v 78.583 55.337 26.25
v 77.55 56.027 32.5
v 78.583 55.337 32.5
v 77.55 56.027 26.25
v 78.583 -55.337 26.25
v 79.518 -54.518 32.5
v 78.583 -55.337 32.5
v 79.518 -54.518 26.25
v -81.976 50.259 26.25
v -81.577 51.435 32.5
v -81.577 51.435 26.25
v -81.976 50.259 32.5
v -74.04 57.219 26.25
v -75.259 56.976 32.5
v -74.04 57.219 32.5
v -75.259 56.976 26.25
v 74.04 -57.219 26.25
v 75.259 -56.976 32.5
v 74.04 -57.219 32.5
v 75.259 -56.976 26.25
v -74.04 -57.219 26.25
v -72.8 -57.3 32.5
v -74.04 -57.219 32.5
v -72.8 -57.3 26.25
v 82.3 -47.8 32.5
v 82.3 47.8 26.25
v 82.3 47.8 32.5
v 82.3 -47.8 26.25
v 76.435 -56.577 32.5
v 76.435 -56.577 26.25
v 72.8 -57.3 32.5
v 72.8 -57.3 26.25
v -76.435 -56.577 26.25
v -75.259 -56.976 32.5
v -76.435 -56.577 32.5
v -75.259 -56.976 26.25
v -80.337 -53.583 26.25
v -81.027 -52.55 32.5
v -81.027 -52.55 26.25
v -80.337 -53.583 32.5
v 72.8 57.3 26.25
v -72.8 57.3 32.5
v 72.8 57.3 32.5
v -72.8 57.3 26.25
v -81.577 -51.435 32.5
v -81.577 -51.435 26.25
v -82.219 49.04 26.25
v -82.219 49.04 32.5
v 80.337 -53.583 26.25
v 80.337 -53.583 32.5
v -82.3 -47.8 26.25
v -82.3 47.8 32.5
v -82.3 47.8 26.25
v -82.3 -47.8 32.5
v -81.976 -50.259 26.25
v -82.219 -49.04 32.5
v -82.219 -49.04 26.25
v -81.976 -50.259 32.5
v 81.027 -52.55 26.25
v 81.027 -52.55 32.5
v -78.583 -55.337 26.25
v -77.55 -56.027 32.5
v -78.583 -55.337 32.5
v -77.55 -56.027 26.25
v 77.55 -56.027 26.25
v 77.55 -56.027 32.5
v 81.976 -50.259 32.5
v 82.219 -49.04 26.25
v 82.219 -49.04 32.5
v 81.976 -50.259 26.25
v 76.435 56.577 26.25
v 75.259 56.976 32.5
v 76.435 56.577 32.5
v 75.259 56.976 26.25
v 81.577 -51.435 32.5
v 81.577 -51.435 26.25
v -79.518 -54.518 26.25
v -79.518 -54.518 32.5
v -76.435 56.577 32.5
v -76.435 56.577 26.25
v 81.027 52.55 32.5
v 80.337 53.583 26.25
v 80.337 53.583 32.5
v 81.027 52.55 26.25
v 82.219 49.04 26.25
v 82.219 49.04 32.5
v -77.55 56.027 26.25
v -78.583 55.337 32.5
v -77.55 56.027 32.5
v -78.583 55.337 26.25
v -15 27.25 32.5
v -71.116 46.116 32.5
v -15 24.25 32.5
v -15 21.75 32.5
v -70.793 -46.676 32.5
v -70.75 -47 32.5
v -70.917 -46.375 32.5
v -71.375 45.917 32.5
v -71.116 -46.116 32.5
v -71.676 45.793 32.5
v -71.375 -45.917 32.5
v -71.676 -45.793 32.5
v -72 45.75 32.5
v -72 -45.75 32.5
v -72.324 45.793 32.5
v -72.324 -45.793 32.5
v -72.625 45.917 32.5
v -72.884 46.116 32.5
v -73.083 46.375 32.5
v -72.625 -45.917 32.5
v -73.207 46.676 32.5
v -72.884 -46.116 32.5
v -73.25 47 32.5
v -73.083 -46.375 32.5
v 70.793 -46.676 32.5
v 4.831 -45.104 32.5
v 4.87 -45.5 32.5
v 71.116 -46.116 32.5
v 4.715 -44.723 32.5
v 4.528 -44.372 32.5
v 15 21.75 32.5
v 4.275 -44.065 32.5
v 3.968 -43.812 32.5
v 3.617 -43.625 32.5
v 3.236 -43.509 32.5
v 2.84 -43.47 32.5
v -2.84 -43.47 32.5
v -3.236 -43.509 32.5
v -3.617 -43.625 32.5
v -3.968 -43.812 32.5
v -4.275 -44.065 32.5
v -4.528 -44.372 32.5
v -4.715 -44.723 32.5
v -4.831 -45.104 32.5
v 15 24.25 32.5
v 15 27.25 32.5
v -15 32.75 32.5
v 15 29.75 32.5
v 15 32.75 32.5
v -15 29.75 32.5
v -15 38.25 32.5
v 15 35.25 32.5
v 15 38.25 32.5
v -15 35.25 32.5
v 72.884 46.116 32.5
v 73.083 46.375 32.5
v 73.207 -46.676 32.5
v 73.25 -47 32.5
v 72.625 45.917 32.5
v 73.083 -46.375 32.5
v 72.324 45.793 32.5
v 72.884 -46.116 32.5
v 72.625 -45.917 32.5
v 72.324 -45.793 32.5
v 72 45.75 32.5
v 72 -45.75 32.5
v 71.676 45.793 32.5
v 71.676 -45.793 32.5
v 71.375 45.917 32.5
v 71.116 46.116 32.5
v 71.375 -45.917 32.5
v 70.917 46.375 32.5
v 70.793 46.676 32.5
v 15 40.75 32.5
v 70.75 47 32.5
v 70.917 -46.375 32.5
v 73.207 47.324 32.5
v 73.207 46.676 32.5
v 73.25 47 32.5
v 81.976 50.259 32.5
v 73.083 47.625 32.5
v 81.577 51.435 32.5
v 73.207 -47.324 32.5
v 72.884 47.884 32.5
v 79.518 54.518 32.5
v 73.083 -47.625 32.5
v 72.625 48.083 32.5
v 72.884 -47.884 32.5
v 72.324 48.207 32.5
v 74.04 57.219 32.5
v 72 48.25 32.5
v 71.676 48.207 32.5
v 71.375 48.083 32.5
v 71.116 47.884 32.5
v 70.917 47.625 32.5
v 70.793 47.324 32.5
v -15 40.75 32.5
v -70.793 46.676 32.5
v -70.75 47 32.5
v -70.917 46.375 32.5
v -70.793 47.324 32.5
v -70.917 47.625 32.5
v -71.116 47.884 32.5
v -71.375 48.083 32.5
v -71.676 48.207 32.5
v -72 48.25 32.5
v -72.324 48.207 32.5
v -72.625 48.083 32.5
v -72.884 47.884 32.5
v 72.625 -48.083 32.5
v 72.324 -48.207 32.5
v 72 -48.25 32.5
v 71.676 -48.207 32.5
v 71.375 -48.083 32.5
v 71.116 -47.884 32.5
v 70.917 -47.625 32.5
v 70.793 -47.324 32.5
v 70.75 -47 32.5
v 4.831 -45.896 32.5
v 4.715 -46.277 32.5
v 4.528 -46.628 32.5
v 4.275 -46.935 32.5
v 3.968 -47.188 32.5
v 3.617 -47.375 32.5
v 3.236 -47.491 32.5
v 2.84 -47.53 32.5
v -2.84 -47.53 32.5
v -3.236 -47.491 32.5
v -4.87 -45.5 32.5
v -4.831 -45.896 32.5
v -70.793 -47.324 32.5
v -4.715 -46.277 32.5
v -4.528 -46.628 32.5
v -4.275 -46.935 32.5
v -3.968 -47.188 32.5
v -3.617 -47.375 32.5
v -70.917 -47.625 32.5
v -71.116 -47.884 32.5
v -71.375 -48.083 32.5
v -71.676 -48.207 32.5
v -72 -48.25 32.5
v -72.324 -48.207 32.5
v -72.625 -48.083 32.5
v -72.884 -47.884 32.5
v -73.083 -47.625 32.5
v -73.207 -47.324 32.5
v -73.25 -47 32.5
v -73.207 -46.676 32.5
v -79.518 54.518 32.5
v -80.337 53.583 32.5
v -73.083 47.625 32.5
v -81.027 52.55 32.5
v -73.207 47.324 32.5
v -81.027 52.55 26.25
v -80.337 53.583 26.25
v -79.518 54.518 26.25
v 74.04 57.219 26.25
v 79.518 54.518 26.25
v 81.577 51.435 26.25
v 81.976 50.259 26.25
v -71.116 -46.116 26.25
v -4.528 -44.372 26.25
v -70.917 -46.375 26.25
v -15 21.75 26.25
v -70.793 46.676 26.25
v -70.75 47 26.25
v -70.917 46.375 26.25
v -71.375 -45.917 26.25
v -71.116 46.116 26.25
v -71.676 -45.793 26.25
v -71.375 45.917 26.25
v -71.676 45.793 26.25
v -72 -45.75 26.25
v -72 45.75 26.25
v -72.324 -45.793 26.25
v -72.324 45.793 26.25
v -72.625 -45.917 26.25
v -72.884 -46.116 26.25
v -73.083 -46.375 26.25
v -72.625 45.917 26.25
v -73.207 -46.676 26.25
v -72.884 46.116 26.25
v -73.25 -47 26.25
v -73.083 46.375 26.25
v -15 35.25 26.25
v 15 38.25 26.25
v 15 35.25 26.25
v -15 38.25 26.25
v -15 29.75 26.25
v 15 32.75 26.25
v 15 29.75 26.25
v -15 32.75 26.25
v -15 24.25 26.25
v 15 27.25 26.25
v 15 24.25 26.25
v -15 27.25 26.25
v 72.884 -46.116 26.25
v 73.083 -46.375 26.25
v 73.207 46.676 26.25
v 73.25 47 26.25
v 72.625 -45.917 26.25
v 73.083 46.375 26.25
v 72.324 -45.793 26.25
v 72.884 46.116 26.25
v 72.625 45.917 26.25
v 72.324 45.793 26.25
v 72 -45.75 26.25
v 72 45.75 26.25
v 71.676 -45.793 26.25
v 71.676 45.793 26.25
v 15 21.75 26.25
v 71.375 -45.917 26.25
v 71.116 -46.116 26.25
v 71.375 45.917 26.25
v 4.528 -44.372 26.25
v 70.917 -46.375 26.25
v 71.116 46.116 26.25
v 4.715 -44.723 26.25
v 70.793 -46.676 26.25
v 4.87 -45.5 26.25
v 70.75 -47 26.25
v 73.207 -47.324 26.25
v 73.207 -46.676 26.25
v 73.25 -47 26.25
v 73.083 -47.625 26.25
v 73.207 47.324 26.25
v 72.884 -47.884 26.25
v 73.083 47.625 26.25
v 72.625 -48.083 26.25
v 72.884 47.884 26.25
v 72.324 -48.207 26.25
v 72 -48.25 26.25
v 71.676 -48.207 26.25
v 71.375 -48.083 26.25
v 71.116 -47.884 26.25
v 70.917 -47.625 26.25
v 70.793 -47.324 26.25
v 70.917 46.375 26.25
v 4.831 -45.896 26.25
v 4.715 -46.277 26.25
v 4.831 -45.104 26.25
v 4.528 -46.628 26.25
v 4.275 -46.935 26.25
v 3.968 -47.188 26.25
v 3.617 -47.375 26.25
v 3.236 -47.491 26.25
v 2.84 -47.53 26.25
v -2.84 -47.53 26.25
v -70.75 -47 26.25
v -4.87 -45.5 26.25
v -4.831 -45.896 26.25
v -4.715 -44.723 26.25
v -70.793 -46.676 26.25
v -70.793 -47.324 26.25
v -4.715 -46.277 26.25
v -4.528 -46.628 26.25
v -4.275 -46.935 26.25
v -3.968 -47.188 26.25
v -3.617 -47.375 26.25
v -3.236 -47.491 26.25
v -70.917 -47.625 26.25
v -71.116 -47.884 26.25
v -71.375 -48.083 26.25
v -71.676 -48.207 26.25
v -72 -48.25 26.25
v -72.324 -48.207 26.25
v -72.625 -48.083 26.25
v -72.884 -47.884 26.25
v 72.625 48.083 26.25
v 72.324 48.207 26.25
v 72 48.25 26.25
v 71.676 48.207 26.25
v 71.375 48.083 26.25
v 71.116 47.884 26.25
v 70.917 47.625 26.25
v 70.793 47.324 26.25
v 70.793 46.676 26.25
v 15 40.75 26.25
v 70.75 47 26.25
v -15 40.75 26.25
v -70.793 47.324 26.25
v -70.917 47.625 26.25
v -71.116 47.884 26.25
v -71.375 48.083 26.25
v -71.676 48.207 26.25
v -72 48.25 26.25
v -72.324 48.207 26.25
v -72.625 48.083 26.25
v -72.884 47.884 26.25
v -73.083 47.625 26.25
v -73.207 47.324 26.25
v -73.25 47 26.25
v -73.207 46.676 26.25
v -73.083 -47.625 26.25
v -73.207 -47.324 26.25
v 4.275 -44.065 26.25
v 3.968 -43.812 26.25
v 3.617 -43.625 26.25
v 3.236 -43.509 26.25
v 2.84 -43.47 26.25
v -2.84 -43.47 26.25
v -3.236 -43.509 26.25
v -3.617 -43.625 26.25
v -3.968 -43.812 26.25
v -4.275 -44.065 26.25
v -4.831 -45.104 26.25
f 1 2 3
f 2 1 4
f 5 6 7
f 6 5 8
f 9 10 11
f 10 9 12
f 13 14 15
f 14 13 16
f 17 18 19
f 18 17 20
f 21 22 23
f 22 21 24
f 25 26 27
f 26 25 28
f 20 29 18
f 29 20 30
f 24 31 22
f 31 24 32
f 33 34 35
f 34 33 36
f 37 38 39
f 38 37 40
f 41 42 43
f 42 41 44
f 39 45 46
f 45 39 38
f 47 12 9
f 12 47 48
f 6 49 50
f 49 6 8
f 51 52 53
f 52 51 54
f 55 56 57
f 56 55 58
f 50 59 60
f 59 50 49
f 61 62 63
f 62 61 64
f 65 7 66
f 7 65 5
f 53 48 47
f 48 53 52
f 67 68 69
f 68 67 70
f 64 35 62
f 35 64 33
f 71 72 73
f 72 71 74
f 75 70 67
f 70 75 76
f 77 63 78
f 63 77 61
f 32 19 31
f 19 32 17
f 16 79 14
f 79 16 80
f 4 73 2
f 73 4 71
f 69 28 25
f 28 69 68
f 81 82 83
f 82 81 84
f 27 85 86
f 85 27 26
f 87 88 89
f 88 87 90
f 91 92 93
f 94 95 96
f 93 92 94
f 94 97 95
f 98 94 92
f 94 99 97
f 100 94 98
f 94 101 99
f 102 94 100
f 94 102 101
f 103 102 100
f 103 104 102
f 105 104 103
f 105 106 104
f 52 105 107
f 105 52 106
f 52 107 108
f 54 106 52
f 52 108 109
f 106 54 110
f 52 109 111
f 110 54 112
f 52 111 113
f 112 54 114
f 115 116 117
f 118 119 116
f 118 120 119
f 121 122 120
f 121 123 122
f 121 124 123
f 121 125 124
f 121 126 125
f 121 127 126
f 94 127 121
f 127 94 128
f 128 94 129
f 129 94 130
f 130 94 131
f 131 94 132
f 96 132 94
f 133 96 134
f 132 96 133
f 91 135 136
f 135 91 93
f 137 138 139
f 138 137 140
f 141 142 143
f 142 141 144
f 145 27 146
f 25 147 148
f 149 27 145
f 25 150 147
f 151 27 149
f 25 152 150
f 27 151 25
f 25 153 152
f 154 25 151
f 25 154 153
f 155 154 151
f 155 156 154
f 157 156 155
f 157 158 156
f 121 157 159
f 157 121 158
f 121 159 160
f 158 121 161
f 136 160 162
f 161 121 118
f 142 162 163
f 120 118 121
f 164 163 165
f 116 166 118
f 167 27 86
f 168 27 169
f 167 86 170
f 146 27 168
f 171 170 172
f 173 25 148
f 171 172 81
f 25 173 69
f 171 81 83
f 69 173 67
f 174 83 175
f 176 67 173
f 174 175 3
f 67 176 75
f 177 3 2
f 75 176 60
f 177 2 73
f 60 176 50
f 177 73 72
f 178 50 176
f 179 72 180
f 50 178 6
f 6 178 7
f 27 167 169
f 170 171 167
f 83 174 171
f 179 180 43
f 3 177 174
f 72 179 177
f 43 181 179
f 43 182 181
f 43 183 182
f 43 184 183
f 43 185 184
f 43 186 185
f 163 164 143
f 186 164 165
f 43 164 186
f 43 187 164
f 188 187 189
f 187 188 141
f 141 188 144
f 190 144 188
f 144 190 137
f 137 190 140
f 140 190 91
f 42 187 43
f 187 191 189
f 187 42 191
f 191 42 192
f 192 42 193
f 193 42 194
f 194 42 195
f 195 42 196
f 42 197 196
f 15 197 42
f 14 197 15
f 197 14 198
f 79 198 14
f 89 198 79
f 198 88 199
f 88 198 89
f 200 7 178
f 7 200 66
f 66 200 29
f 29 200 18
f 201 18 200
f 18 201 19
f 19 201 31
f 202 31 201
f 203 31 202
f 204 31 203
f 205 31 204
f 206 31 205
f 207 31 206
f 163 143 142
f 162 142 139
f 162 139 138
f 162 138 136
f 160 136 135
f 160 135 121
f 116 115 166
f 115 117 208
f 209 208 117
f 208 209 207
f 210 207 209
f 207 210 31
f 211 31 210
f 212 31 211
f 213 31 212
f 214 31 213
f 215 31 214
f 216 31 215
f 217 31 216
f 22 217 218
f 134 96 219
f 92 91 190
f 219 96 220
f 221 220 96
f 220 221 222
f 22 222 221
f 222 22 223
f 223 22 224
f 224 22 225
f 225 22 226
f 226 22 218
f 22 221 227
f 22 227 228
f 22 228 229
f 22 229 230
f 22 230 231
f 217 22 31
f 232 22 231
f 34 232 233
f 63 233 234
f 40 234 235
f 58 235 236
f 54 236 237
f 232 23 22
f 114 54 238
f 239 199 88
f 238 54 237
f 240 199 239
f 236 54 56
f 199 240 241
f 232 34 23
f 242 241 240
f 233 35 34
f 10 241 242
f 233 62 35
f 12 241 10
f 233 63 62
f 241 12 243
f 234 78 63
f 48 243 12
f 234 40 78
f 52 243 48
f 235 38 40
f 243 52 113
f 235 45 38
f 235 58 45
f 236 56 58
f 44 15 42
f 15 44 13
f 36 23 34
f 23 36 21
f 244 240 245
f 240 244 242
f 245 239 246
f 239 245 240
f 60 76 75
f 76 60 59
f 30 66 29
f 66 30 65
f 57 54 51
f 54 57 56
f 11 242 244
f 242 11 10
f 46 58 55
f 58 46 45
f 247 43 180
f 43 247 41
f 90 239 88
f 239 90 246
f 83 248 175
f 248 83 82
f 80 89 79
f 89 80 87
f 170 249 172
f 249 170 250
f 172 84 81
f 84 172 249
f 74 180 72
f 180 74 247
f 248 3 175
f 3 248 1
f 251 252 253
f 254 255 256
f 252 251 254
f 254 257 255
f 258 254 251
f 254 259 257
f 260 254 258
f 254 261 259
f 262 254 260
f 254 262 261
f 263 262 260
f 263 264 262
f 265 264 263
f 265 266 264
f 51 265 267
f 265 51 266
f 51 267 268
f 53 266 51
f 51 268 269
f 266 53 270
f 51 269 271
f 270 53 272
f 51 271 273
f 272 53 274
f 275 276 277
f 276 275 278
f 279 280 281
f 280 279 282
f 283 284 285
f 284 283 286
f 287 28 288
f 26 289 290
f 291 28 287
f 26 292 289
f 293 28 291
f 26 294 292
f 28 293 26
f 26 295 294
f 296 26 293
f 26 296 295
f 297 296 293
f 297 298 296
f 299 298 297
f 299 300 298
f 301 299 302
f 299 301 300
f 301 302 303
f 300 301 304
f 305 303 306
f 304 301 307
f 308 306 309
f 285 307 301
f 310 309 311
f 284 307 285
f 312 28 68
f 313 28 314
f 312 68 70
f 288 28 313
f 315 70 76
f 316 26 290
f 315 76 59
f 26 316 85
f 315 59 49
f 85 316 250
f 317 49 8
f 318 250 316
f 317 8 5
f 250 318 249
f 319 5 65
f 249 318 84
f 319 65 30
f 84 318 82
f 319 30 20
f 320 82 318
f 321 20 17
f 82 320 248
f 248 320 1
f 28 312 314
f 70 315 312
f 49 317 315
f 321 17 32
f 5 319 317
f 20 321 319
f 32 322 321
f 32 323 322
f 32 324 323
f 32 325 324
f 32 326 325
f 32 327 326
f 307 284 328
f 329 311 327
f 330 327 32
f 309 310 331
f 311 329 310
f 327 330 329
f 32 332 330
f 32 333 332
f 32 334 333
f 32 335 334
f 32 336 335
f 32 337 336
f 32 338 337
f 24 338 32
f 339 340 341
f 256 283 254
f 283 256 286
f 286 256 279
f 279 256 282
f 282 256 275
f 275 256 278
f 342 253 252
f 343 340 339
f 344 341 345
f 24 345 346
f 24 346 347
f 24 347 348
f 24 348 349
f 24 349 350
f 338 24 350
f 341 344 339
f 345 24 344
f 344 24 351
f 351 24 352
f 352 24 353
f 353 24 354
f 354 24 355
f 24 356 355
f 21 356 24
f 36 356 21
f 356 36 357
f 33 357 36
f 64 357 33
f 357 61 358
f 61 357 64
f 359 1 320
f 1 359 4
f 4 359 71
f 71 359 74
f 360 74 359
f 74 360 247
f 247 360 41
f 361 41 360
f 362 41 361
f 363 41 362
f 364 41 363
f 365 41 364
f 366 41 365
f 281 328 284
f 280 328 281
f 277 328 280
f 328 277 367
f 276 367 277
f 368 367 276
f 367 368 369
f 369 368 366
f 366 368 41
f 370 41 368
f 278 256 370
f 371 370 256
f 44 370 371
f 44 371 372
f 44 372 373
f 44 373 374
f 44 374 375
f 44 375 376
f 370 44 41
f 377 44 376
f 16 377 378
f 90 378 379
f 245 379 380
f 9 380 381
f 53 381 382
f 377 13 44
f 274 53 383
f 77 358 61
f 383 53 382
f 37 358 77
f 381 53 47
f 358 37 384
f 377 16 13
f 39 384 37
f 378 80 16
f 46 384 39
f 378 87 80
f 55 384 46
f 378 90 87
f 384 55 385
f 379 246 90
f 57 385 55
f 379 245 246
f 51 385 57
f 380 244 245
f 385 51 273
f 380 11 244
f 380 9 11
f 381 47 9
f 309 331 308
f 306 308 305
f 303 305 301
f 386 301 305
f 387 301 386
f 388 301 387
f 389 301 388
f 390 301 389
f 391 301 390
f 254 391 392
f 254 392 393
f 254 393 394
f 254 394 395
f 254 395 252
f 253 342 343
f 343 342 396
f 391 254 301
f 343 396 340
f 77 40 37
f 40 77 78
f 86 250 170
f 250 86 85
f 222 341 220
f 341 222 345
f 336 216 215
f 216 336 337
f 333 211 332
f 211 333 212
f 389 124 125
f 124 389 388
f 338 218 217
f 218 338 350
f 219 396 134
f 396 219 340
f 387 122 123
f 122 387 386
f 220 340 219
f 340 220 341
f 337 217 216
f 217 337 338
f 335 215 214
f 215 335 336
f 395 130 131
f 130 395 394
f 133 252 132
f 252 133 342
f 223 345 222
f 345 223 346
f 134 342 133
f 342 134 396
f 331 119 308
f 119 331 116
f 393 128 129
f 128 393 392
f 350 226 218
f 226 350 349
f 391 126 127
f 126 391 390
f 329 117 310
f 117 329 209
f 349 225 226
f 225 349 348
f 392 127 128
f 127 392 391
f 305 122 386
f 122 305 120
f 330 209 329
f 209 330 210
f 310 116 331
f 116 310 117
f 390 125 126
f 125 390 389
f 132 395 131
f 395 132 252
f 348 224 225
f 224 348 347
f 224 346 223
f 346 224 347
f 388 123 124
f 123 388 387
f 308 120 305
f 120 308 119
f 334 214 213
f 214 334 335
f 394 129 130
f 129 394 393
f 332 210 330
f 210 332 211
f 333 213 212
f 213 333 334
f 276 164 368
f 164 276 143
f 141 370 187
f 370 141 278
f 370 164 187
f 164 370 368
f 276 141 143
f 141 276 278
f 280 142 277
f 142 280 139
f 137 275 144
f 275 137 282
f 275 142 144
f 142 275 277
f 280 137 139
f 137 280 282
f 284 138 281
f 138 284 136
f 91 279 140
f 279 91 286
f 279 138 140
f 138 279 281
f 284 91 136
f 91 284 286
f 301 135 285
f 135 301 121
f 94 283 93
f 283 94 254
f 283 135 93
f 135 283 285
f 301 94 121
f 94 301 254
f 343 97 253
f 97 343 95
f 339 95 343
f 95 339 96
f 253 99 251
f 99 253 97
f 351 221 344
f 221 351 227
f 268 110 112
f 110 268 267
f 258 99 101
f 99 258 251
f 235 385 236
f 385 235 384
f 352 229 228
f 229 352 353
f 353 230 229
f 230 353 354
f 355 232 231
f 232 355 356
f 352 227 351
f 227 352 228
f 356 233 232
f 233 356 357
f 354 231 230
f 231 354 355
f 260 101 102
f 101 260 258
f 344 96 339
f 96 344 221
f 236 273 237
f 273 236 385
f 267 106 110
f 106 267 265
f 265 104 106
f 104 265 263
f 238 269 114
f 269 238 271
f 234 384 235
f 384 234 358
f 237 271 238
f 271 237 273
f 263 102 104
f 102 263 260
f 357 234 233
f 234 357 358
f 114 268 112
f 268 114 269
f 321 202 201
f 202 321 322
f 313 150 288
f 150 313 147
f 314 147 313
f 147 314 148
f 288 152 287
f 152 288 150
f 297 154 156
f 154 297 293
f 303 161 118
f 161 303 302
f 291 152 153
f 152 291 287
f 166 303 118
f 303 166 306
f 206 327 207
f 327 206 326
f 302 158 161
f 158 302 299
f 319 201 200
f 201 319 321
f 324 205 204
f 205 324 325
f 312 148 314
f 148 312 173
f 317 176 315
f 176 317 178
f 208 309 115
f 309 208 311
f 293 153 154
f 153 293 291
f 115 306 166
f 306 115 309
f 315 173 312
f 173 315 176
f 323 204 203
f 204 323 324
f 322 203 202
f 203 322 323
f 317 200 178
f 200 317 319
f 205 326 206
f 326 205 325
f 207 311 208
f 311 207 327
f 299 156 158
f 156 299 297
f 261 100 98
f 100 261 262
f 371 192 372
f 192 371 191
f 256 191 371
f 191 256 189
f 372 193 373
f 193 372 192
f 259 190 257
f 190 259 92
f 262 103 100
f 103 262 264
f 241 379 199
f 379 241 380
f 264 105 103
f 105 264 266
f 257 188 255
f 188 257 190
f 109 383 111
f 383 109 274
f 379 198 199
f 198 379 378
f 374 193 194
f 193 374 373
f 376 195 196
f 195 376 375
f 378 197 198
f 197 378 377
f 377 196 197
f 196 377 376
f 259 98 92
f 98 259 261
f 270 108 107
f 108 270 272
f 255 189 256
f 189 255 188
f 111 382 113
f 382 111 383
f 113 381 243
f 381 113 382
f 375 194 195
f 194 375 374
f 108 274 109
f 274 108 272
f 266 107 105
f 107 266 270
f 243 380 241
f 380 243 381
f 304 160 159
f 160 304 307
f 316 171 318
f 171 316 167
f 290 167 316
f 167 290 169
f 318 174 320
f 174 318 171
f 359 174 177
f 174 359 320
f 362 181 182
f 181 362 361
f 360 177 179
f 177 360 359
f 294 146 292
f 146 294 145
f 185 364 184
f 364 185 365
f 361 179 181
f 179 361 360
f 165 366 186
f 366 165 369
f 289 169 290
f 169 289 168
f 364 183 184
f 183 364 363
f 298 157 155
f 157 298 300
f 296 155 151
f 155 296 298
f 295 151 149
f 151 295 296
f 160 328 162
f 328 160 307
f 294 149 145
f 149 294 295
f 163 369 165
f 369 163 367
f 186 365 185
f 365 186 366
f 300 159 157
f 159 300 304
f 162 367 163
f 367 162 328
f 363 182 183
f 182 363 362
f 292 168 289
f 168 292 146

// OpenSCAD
color(alpha = 0.9, c = "WhiteSmoke") {
	difference() {
		difference() {
			difference() {
				difference() {
					difference() {
						difference() {
							difference() {
								difference() {
									difference() {
										translate(v = [0, 0, 29.375]) {
											hull() {
												translate(v = [-72.8, -47.8, 0]) {
													cylinder($fn = 48, center = true, h = 6.25, r = 9.5);
												}
												translate(v = [-72.8, 47.8, 0]) {
													cylinder($fn = 48, center = true, h = 6.25, r = 9.5);
												}
												translate(v = [72.8, -47.8, 0]) {
													cylinder($fn = 48, center = true, h = 6.25, r = 9.5);
												}
												translate(v = [72.8, 47.8, 0]) {
													cylinder($fn = 48, center = true, h = 6.25, r = 9.5);
												}
											}
										}
										translate(v = [0, -45.5, 29.375]) {
											linear_extrude(center = true, height = 6.65) {
												hull() {
													translate(v = [-2.84, 0]) {
														circle($fn = 32, r = 2.0300000000000002);
													}
													translate(v = [2.84, 0]) {
														circle($fn = 32, r = 2.0300000000000002);
													}
												}
											}
										}
									}
									translate(v = [0, 39.5, 29.375]) {
										cube(center = true, size = [30.0, 2.5, 6.65]);
									}
								}
								translate(v = [0, 34.0, 29.375]) {
									cube(center = true, size = [30.0, 2.5, 6.65]);
								}
							}
							translate(v = [0, 28.5, 29.375]) {
								cube(center = true, size = [30.0, 2.5, 6.65]);
							}
						}
						translate(v = [0, 23.0, 29.375]) {
							cube(center = true, size = [30.0, 2.5, 6.65]);
						}
					}
					translate(v = [-72.0, -47.0, 29.375]) {
						cylinder($fn = 24, center = true, d = 2.5, h = 6.65);
					}
				}
				translate(v = [72.0, -47.0, 29.375]) {
					cylinder($fn = 24, center = true, d = 2.5, h = 6.65);
				}
			}
			translate(v = [-72.0, 47.0, 29.375]) {
				cylinder($fn = 24, center = true, d = 2.5, h = 6.65);
			}
		}
		translate(v = [72.0, 47.0, 29.375]) {
			cylinder($fn = 24, center = true, d = 2.5, h = 6.65);
		}
	}
}
